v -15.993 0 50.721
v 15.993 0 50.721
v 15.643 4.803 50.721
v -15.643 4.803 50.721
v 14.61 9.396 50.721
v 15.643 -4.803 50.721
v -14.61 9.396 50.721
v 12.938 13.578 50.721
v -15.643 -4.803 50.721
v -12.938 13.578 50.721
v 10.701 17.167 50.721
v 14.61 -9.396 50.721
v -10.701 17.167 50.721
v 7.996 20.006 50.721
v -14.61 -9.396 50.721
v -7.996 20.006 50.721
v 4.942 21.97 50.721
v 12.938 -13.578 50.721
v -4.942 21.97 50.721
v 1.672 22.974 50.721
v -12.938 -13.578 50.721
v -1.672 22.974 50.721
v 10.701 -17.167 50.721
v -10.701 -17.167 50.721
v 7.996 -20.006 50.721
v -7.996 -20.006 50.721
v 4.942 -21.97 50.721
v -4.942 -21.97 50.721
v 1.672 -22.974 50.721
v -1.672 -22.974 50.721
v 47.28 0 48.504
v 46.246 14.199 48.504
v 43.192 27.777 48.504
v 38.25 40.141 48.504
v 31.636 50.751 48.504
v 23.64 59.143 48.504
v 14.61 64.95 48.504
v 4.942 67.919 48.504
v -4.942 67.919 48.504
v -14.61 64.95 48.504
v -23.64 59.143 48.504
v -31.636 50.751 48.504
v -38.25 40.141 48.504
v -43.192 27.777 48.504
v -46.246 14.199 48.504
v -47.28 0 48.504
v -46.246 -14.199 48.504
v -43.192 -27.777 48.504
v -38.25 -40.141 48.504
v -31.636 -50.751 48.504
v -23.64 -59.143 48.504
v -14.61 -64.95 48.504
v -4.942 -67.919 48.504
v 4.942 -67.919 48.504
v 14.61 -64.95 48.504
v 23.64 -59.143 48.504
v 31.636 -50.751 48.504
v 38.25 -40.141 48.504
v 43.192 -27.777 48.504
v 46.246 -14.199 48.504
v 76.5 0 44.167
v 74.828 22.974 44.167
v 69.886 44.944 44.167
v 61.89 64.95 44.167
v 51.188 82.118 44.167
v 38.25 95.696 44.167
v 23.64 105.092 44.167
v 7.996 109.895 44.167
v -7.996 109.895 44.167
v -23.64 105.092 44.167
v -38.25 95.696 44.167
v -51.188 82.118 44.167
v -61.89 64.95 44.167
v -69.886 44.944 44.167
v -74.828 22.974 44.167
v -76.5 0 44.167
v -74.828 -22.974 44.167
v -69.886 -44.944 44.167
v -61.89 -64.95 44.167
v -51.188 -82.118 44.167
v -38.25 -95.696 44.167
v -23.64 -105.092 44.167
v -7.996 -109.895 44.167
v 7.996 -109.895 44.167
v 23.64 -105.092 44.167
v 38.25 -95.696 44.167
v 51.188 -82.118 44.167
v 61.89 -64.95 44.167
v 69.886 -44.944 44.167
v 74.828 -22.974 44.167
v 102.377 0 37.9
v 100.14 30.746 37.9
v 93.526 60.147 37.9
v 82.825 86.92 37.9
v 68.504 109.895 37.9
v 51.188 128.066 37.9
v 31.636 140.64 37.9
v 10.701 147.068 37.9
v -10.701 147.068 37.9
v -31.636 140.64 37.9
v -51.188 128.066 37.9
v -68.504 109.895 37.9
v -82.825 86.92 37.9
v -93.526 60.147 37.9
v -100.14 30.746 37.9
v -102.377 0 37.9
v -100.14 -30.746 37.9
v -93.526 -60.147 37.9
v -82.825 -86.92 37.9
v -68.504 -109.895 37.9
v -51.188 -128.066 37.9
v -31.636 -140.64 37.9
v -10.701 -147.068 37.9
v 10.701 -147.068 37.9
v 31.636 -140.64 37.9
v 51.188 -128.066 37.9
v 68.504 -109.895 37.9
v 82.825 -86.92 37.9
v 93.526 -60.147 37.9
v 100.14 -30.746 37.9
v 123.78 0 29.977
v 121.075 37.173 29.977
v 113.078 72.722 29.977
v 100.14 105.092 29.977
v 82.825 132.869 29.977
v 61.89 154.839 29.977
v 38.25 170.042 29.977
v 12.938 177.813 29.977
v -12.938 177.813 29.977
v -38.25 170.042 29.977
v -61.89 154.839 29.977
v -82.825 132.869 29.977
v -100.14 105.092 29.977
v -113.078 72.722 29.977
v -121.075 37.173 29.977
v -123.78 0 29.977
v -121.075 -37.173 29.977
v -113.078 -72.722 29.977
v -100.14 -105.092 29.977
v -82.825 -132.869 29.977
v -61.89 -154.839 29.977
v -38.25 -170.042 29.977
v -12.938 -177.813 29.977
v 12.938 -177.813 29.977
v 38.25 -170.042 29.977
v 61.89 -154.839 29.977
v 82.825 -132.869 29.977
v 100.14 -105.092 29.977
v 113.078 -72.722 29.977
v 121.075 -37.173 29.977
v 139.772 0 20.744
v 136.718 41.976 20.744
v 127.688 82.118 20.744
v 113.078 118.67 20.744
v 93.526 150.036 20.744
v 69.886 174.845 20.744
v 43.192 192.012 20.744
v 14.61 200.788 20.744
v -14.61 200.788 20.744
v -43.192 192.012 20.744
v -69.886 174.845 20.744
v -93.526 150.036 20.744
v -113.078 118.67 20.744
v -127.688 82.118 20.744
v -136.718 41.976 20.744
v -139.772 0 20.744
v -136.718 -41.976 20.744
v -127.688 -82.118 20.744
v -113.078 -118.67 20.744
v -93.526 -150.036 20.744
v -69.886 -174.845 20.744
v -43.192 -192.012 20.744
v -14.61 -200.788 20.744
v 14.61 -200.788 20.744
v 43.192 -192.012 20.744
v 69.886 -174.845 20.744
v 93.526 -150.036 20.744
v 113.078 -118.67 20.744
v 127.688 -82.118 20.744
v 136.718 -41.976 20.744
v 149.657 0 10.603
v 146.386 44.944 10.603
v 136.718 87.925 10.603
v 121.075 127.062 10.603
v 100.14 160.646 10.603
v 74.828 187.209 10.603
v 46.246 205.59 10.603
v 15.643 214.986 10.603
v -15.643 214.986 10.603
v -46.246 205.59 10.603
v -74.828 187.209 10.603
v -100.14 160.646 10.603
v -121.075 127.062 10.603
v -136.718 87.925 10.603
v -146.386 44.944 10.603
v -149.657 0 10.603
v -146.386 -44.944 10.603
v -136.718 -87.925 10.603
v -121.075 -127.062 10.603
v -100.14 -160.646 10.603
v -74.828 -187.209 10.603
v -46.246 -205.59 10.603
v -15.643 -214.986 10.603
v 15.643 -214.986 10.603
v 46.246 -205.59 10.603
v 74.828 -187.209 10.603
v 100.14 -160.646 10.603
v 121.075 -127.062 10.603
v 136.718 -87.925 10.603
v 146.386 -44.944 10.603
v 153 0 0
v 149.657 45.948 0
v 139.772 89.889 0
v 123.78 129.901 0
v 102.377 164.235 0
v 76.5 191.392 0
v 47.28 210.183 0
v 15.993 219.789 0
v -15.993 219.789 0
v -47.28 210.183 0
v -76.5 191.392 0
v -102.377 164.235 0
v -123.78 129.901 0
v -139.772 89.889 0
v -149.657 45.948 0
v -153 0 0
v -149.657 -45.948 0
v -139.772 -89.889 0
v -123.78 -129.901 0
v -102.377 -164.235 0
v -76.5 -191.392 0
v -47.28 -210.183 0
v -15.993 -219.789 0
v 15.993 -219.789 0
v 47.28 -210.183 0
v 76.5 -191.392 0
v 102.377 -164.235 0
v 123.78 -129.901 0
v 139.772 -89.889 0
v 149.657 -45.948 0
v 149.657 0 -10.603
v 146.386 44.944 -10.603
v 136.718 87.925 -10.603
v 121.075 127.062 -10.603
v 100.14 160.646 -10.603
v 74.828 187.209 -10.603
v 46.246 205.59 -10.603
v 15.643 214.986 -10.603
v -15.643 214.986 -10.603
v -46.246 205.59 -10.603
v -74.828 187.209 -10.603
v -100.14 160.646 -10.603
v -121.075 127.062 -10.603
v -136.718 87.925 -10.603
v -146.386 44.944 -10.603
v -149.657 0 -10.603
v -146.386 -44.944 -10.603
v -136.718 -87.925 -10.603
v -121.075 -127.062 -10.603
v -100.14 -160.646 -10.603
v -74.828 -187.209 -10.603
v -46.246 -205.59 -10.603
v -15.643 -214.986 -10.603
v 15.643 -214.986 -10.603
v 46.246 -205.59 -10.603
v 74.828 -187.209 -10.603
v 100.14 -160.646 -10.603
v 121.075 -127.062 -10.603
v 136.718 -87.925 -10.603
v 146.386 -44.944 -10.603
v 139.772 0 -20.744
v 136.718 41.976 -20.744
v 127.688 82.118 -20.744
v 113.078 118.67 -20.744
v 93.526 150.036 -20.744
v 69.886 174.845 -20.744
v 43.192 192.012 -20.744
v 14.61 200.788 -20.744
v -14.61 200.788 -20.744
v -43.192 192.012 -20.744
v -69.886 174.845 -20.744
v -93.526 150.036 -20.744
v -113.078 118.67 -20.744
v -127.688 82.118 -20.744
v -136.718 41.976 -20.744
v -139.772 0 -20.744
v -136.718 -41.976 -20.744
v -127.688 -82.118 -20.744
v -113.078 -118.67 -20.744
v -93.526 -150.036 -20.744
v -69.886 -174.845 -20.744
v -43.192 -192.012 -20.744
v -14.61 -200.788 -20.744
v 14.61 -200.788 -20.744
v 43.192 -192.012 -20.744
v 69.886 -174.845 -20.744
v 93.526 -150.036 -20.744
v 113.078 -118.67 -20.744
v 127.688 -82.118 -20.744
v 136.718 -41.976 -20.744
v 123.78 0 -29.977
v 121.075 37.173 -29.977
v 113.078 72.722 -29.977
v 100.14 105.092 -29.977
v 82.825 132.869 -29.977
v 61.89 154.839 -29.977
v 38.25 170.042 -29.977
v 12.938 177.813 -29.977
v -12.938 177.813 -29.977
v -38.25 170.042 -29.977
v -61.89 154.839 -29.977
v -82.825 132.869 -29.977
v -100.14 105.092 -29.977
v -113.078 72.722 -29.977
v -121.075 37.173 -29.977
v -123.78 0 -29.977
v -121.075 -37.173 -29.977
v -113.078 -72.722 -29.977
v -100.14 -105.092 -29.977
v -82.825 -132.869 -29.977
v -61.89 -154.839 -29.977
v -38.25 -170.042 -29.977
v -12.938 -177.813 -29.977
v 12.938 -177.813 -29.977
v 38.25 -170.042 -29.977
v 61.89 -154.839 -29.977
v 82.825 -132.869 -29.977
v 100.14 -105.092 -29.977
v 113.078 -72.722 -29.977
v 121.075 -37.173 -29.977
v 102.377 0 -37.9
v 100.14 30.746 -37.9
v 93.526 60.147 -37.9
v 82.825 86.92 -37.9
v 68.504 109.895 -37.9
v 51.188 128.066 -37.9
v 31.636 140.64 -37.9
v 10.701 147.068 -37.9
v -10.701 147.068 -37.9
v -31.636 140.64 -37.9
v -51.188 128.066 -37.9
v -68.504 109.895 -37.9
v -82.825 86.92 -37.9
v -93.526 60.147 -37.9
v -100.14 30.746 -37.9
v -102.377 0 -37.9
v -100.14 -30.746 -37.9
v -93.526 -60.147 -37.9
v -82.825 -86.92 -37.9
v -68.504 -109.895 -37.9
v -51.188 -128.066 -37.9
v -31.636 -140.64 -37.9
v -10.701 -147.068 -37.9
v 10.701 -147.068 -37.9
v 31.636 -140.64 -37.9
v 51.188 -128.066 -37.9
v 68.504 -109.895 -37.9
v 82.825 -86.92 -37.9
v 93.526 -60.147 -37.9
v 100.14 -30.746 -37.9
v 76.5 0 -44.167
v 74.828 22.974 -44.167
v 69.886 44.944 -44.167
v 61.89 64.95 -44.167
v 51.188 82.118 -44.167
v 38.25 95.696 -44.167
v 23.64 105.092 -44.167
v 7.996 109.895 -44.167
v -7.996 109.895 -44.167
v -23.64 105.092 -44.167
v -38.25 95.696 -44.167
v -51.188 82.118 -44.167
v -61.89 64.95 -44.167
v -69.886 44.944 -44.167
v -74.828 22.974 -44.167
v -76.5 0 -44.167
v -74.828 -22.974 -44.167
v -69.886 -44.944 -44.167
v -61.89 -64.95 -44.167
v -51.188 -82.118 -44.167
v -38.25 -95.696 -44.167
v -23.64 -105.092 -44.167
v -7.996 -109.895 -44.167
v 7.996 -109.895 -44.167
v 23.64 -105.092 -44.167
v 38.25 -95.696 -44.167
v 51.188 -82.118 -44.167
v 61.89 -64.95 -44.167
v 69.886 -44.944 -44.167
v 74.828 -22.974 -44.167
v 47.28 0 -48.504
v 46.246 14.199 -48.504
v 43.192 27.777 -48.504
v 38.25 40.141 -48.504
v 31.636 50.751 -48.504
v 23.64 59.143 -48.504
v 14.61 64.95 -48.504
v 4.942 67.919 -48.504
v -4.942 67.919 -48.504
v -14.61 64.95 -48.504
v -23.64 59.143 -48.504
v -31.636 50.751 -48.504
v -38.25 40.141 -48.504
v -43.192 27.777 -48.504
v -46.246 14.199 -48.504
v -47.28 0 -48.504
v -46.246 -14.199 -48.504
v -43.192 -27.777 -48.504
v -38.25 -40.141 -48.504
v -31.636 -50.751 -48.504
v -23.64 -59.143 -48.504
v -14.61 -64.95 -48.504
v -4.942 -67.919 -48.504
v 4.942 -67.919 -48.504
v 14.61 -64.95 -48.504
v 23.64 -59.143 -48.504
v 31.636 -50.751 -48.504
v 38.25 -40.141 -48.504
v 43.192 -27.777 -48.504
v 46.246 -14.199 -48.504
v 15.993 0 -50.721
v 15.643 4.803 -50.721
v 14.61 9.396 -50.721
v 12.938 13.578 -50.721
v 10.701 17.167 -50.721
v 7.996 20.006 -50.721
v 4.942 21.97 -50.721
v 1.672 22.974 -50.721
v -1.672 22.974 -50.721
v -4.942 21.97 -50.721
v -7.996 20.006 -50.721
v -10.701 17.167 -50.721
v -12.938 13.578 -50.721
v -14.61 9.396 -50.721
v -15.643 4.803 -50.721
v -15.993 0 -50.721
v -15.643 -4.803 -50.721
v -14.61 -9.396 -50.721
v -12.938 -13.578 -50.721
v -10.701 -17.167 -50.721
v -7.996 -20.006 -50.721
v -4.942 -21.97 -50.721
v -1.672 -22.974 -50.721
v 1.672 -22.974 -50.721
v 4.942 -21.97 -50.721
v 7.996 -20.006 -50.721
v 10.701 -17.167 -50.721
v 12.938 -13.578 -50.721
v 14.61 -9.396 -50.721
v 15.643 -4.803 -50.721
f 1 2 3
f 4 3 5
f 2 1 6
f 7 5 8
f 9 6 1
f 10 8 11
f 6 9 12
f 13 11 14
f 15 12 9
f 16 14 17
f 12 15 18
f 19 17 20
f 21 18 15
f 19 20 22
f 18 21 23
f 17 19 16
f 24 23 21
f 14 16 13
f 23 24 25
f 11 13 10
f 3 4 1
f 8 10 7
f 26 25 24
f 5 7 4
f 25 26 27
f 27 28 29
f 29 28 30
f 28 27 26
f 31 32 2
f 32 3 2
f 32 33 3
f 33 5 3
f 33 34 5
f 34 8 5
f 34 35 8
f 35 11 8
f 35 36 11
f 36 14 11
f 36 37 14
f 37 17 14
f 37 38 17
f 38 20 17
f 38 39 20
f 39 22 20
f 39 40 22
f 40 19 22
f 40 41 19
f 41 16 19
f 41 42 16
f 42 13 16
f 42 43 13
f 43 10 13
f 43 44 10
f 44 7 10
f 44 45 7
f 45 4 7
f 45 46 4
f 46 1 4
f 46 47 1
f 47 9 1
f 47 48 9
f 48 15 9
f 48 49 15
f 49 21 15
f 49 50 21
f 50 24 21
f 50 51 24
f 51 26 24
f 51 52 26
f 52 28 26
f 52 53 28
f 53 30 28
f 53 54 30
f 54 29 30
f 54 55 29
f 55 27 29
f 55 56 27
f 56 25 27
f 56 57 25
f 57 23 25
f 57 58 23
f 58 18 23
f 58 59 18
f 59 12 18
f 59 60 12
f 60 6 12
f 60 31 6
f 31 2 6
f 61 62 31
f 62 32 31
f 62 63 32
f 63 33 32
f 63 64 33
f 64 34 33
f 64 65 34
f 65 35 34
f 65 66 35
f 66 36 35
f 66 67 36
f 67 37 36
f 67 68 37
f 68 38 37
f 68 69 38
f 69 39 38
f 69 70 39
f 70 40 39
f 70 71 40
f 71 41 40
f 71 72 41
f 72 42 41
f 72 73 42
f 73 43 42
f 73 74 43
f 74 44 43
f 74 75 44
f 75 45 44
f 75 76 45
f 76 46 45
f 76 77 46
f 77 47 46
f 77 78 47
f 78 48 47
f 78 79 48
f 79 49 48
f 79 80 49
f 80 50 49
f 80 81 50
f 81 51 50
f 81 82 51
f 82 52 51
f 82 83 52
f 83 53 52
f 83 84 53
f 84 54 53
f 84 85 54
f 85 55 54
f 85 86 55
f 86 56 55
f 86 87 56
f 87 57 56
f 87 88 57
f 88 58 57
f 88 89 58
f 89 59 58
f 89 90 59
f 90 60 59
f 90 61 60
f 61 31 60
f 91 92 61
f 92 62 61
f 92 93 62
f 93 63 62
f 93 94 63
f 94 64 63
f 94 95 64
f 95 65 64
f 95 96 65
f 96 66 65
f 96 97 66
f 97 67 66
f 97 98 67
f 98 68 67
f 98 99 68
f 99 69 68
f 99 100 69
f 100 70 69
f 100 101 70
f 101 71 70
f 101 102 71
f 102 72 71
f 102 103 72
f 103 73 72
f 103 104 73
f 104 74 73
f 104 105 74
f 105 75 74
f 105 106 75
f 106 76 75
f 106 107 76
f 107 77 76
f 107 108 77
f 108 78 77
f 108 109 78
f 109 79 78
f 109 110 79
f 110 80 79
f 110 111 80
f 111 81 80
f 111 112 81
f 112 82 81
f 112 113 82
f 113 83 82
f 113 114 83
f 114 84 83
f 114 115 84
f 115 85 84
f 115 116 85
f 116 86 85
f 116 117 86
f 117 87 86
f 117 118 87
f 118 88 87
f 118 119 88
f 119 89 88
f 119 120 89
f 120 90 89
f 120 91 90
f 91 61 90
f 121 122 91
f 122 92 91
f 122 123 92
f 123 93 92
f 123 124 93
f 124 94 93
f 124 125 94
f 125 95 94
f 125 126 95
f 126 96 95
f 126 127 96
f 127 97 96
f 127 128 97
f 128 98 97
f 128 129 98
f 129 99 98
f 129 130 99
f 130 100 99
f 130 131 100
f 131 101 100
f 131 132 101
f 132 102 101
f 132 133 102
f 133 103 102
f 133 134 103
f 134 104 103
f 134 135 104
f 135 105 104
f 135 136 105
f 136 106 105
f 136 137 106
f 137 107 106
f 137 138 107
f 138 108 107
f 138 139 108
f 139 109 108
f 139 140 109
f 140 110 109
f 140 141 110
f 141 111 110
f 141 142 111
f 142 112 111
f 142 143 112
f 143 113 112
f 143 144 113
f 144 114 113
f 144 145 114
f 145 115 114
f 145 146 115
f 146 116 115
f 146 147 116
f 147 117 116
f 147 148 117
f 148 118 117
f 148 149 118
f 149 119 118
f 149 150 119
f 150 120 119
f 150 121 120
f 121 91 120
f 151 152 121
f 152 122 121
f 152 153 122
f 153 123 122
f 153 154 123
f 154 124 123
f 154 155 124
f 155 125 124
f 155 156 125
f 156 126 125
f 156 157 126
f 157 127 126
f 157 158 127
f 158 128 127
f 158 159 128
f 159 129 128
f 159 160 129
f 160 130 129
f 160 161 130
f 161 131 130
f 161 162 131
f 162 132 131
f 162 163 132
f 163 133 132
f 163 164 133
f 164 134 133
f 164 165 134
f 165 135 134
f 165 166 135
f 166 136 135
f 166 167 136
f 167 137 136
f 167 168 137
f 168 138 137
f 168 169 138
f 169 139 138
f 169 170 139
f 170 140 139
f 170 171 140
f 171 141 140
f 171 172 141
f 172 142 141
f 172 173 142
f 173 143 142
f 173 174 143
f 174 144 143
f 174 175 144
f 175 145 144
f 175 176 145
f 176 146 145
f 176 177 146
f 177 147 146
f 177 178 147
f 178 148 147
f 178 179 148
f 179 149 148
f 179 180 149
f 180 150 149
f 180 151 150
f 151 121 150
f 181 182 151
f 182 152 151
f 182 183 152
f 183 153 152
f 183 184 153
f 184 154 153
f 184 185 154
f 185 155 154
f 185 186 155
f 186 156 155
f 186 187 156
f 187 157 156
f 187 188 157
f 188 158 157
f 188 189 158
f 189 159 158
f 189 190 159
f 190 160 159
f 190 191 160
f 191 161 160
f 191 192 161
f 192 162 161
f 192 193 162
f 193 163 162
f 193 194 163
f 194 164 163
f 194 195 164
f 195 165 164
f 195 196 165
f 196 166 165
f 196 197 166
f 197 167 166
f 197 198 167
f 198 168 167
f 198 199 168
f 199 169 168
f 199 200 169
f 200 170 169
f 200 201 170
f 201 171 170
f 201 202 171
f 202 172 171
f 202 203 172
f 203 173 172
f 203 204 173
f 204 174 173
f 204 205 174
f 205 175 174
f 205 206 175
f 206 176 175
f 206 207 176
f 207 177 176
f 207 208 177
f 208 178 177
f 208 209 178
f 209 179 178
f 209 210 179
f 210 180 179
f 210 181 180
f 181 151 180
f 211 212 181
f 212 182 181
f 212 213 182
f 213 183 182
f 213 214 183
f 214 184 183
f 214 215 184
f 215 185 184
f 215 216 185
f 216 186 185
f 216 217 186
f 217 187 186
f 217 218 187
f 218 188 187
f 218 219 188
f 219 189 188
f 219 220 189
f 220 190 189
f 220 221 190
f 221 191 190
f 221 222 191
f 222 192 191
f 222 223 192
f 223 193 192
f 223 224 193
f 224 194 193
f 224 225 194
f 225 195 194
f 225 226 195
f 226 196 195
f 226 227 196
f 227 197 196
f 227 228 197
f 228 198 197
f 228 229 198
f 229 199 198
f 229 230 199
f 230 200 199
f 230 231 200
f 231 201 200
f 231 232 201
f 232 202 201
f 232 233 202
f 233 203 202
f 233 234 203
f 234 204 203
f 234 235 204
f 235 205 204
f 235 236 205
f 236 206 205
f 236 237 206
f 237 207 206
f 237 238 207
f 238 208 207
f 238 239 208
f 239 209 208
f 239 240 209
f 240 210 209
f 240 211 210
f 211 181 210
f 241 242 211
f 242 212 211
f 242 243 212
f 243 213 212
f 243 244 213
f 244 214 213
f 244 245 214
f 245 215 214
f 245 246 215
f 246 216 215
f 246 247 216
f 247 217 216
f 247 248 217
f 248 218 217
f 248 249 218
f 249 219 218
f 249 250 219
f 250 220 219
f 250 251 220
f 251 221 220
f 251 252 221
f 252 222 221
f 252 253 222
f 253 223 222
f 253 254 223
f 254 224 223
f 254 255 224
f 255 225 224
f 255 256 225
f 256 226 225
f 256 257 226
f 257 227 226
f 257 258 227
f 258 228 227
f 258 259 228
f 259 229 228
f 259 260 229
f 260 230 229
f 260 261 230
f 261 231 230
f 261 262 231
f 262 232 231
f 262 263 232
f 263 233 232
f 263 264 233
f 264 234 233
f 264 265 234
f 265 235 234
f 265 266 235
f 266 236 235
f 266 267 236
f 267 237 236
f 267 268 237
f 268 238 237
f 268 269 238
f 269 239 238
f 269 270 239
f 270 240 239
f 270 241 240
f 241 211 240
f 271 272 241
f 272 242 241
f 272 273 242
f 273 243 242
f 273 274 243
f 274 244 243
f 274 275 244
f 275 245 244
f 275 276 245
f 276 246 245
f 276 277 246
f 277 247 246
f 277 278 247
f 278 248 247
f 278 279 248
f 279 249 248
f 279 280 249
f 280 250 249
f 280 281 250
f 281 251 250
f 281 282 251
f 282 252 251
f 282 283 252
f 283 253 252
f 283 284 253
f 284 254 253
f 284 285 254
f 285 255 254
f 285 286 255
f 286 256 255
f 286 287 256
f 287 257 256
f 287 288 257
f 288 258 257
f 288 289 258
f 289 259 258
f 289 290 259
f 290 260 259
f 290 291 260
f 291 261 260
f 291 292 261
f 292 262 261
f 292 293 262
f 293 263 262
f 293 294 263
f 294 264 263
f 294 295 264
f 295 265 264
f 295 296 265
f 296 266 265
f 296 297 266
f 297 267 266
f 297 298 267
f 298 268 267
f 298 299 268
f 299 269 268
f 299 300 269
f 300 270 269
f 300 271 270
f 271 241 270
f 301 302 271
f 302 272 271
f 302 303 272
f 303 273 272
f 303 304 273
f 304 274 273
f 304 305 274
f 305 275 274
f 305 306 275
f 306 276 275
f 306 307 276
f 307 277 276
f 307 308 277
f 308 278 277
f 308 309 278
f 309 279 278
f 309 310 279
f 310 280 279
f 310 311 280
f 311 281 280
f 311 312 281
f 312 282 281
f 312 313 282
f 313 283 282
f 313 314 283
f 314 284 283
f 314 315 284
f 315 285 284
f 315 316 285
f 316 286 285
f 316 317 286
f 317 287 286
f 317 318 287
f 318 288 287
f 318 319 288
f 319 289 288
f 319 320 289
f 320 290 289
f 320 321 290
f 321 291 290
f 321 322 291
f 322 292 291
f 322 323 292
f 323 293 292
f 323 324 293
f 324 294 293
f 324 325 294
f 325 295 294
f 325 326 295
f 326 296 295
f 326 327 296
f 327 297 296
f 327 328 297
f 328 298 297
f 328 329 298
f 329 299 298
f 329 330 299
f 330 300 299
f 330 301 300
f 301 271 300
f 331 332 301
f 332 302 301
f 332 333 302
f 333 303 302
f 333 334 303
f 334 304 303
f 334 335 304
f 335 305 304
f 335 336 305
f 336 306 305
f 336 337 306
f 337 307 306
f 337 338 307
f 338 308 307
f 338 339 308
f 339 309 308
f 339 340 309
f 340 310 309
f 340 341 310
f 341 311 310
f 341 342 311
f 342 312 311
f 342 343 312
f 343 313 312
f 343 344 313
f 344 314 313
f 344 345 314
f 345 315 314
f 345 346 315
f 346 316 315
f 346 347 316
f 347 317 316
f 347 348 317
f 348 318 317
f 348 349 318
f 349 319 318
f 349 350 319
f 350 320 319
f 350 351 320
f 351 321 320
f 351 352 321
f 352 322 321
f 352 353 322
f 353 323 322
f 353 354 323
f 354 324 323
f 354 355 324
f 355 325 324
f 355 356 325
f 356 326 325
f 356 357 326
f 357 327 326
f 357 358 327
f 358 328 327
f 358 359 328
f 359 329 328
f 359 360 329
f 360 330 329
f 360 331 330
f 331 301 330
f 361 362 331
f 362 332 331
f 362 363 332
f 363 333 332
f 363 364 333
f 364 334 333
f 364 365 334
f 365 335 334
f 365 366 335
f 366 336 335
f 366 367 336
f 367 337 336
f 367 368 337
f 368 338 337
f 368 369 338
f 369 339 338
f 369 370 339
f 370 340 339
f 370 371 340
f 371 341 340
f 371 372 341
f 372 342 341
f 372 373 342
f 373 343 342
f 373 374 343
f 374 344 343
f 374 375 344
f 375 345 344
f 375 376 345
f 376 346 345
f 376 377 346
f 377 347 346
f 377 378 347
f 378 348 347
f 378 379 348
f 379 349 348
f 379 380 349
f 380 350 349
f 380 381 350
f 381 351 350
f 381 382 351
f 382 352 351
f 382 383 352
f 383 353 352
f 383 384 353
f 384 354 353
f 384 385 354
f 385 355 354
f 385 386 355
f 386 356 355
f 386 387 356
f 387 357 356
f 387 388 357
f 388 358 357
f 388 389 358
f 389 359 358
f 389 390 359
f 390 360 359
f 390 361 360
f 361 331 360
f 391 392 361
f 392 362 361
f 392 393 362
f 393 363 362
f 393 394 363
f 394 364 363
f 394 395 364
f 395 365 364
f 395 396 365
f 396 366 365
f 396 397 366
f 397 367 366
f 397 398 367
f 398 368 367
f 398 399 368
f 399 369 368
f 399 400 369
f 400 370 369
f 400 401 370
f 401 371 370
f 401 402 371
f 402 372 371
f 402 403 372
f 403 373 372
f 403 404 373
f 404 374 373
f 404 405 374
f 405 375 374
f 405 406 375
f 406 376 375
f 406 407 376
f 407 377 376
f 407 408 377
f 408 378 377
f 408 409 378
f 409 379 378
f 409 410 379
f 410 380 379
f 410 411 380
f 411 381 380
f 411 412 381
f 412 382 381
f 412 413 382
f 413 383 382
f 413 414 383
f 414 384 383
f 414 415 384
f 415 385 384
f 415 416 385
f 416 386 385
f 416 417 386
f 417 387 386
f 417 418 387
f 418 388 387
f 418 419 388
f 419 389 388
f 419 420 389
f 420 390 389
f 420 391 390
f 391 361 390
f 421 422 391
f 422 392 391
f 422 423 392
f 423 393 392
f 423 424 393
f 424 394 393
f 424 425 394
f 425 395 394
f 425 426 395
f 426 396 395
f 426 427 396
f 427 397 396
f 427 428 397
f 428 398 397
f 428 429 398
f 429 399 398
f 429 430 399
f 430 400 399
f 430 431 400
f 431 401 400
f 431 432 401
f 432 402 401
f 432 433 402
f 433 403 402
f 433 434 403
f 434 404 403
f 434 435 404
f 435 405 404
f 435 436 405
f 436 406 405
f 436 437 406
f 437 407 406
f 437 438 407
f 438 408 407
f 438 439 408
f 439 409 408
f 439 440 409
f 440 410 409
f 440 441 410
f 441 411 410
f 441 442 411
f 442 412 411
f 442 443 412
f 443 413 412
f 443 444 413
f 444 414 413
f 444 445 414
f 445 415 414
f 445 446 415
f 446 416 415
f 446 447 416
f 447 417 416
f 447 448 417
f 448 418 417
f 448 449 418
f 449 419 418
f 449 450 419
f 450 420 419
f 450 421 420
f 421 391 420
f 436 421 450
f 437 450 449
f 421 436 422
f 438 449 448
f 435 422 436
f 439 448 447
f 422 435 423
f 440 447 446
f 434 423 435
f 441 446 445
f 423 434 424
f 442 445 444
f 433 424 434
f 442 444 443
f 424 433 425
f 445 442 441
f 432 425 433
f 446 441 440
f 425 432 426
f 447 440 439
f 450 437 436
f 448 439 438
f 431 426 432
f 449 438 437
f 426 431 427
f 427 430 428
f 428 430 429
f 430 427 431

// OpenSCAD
// Generated by SolidPython 1.0.1 on 2020-07-29 00:46:48


scale(v = [9, 13, 3]) {
	sphere(r = 17);
}
/***********************************************
*********      SolidPython code:      **********
************************************************
 
# import packages: SolidPython
from solid import *
from solid.utils import *
from itertools import chain, combinations, permutations


class Resize:

    def __init__(self, scad_file):
        self.scad_file = scad_file
        #self.scad_file = import_scad(scad_file)
        # cone/cylinder param:
        self.r1 = 0
        self.r2 = 0
        self.h = 0
        # rectangular prism param:
        self.w = 0
        self.l = 0
        # ellipse param:
        self.r = 0

    # import OpenScad code (file name corresponds to shape)


    # classify shape + parameters
    def assign(self, param1, param2, param3):
        if self.scad_file == 'cone.scad':
            self.r1 = param1
            self.r2 = param2
            self.h = param3
        elif self.scad_file == 'cylinder.scad':
            self.r1 = param1
            self.r2 = param2
            self.h = param3
        elif self.scad_file == 'rectangularPrism.scad':
            self.h = param1
            self.l = param2
            self.w = param3
        else:
            self.r = param1
            self.h = param2

    # resize parameters
    def iterate(self):
        x = range(3, 20, 2)
        i = 1
        if self.scad_file == 'cone.scad':
            tempList = list(permutations(x, 2))
            for temp in tempList:
                param1 = temp[0]
                param2 = temp[1]
                filepath = 'produced_scad_files/' + 'cone' + str(param1) + '_' + str(param2) + '_' + '.scad'
                scad_render_to_file(cylinder(h=param1, r1=param2, r2=0), filepath)

        elif self.scad_file == 'cylinder.scad':
            tempList = list(permutations(x, 3))
            for temp in tempList:
                param1 = temp[0]
                param2 = temp[1]
                filepath = 'produced_scad_files/' + 'cylinder' + str(param1) + '_' + str(param2) + '_' + '.scad'
                scad_render_to_file(cylinder(h=param1, r1=param2, r2=param2), filepath)

        elif self.scad_file == 'rectangularPrism.scad':
            tempList = list(permutations(x, 3))
            for temp in tempList:
                param1 = temp[0]
                param2 = temp[1]
                param3 = temp[2]
                filepath = 'produced_scad_files/' + 'rectangularPrism' + str(param1) + '_' + str(param2) + '_' + str(
                    param3) + '.scad'
                scad_render_to_file(cube(size=(param1, param2, param3)), filepath)

        elif self.scad_file == 'ellipse.scad':
            tempList = list(permutations(x, 4))
            for temp in tempList:
                param1 = temp[0]
                param2 = temp[1]
                param3 = temp[2]
                param4 = temp[3]
                filepath = 'produced_scad_files/' + 'ellipse' + str(param1) + '_' + str(param2) + '_' + str(param3) + '_' + str(param4) + '.scad'
                scad_render_to_file(scale([param1, param2, param3])(sphere(r=param4)), filepath)

    def render_to_scadfile(self):
        scad_render_to_file(scad, 'example.scad') 
 
************************************************/
